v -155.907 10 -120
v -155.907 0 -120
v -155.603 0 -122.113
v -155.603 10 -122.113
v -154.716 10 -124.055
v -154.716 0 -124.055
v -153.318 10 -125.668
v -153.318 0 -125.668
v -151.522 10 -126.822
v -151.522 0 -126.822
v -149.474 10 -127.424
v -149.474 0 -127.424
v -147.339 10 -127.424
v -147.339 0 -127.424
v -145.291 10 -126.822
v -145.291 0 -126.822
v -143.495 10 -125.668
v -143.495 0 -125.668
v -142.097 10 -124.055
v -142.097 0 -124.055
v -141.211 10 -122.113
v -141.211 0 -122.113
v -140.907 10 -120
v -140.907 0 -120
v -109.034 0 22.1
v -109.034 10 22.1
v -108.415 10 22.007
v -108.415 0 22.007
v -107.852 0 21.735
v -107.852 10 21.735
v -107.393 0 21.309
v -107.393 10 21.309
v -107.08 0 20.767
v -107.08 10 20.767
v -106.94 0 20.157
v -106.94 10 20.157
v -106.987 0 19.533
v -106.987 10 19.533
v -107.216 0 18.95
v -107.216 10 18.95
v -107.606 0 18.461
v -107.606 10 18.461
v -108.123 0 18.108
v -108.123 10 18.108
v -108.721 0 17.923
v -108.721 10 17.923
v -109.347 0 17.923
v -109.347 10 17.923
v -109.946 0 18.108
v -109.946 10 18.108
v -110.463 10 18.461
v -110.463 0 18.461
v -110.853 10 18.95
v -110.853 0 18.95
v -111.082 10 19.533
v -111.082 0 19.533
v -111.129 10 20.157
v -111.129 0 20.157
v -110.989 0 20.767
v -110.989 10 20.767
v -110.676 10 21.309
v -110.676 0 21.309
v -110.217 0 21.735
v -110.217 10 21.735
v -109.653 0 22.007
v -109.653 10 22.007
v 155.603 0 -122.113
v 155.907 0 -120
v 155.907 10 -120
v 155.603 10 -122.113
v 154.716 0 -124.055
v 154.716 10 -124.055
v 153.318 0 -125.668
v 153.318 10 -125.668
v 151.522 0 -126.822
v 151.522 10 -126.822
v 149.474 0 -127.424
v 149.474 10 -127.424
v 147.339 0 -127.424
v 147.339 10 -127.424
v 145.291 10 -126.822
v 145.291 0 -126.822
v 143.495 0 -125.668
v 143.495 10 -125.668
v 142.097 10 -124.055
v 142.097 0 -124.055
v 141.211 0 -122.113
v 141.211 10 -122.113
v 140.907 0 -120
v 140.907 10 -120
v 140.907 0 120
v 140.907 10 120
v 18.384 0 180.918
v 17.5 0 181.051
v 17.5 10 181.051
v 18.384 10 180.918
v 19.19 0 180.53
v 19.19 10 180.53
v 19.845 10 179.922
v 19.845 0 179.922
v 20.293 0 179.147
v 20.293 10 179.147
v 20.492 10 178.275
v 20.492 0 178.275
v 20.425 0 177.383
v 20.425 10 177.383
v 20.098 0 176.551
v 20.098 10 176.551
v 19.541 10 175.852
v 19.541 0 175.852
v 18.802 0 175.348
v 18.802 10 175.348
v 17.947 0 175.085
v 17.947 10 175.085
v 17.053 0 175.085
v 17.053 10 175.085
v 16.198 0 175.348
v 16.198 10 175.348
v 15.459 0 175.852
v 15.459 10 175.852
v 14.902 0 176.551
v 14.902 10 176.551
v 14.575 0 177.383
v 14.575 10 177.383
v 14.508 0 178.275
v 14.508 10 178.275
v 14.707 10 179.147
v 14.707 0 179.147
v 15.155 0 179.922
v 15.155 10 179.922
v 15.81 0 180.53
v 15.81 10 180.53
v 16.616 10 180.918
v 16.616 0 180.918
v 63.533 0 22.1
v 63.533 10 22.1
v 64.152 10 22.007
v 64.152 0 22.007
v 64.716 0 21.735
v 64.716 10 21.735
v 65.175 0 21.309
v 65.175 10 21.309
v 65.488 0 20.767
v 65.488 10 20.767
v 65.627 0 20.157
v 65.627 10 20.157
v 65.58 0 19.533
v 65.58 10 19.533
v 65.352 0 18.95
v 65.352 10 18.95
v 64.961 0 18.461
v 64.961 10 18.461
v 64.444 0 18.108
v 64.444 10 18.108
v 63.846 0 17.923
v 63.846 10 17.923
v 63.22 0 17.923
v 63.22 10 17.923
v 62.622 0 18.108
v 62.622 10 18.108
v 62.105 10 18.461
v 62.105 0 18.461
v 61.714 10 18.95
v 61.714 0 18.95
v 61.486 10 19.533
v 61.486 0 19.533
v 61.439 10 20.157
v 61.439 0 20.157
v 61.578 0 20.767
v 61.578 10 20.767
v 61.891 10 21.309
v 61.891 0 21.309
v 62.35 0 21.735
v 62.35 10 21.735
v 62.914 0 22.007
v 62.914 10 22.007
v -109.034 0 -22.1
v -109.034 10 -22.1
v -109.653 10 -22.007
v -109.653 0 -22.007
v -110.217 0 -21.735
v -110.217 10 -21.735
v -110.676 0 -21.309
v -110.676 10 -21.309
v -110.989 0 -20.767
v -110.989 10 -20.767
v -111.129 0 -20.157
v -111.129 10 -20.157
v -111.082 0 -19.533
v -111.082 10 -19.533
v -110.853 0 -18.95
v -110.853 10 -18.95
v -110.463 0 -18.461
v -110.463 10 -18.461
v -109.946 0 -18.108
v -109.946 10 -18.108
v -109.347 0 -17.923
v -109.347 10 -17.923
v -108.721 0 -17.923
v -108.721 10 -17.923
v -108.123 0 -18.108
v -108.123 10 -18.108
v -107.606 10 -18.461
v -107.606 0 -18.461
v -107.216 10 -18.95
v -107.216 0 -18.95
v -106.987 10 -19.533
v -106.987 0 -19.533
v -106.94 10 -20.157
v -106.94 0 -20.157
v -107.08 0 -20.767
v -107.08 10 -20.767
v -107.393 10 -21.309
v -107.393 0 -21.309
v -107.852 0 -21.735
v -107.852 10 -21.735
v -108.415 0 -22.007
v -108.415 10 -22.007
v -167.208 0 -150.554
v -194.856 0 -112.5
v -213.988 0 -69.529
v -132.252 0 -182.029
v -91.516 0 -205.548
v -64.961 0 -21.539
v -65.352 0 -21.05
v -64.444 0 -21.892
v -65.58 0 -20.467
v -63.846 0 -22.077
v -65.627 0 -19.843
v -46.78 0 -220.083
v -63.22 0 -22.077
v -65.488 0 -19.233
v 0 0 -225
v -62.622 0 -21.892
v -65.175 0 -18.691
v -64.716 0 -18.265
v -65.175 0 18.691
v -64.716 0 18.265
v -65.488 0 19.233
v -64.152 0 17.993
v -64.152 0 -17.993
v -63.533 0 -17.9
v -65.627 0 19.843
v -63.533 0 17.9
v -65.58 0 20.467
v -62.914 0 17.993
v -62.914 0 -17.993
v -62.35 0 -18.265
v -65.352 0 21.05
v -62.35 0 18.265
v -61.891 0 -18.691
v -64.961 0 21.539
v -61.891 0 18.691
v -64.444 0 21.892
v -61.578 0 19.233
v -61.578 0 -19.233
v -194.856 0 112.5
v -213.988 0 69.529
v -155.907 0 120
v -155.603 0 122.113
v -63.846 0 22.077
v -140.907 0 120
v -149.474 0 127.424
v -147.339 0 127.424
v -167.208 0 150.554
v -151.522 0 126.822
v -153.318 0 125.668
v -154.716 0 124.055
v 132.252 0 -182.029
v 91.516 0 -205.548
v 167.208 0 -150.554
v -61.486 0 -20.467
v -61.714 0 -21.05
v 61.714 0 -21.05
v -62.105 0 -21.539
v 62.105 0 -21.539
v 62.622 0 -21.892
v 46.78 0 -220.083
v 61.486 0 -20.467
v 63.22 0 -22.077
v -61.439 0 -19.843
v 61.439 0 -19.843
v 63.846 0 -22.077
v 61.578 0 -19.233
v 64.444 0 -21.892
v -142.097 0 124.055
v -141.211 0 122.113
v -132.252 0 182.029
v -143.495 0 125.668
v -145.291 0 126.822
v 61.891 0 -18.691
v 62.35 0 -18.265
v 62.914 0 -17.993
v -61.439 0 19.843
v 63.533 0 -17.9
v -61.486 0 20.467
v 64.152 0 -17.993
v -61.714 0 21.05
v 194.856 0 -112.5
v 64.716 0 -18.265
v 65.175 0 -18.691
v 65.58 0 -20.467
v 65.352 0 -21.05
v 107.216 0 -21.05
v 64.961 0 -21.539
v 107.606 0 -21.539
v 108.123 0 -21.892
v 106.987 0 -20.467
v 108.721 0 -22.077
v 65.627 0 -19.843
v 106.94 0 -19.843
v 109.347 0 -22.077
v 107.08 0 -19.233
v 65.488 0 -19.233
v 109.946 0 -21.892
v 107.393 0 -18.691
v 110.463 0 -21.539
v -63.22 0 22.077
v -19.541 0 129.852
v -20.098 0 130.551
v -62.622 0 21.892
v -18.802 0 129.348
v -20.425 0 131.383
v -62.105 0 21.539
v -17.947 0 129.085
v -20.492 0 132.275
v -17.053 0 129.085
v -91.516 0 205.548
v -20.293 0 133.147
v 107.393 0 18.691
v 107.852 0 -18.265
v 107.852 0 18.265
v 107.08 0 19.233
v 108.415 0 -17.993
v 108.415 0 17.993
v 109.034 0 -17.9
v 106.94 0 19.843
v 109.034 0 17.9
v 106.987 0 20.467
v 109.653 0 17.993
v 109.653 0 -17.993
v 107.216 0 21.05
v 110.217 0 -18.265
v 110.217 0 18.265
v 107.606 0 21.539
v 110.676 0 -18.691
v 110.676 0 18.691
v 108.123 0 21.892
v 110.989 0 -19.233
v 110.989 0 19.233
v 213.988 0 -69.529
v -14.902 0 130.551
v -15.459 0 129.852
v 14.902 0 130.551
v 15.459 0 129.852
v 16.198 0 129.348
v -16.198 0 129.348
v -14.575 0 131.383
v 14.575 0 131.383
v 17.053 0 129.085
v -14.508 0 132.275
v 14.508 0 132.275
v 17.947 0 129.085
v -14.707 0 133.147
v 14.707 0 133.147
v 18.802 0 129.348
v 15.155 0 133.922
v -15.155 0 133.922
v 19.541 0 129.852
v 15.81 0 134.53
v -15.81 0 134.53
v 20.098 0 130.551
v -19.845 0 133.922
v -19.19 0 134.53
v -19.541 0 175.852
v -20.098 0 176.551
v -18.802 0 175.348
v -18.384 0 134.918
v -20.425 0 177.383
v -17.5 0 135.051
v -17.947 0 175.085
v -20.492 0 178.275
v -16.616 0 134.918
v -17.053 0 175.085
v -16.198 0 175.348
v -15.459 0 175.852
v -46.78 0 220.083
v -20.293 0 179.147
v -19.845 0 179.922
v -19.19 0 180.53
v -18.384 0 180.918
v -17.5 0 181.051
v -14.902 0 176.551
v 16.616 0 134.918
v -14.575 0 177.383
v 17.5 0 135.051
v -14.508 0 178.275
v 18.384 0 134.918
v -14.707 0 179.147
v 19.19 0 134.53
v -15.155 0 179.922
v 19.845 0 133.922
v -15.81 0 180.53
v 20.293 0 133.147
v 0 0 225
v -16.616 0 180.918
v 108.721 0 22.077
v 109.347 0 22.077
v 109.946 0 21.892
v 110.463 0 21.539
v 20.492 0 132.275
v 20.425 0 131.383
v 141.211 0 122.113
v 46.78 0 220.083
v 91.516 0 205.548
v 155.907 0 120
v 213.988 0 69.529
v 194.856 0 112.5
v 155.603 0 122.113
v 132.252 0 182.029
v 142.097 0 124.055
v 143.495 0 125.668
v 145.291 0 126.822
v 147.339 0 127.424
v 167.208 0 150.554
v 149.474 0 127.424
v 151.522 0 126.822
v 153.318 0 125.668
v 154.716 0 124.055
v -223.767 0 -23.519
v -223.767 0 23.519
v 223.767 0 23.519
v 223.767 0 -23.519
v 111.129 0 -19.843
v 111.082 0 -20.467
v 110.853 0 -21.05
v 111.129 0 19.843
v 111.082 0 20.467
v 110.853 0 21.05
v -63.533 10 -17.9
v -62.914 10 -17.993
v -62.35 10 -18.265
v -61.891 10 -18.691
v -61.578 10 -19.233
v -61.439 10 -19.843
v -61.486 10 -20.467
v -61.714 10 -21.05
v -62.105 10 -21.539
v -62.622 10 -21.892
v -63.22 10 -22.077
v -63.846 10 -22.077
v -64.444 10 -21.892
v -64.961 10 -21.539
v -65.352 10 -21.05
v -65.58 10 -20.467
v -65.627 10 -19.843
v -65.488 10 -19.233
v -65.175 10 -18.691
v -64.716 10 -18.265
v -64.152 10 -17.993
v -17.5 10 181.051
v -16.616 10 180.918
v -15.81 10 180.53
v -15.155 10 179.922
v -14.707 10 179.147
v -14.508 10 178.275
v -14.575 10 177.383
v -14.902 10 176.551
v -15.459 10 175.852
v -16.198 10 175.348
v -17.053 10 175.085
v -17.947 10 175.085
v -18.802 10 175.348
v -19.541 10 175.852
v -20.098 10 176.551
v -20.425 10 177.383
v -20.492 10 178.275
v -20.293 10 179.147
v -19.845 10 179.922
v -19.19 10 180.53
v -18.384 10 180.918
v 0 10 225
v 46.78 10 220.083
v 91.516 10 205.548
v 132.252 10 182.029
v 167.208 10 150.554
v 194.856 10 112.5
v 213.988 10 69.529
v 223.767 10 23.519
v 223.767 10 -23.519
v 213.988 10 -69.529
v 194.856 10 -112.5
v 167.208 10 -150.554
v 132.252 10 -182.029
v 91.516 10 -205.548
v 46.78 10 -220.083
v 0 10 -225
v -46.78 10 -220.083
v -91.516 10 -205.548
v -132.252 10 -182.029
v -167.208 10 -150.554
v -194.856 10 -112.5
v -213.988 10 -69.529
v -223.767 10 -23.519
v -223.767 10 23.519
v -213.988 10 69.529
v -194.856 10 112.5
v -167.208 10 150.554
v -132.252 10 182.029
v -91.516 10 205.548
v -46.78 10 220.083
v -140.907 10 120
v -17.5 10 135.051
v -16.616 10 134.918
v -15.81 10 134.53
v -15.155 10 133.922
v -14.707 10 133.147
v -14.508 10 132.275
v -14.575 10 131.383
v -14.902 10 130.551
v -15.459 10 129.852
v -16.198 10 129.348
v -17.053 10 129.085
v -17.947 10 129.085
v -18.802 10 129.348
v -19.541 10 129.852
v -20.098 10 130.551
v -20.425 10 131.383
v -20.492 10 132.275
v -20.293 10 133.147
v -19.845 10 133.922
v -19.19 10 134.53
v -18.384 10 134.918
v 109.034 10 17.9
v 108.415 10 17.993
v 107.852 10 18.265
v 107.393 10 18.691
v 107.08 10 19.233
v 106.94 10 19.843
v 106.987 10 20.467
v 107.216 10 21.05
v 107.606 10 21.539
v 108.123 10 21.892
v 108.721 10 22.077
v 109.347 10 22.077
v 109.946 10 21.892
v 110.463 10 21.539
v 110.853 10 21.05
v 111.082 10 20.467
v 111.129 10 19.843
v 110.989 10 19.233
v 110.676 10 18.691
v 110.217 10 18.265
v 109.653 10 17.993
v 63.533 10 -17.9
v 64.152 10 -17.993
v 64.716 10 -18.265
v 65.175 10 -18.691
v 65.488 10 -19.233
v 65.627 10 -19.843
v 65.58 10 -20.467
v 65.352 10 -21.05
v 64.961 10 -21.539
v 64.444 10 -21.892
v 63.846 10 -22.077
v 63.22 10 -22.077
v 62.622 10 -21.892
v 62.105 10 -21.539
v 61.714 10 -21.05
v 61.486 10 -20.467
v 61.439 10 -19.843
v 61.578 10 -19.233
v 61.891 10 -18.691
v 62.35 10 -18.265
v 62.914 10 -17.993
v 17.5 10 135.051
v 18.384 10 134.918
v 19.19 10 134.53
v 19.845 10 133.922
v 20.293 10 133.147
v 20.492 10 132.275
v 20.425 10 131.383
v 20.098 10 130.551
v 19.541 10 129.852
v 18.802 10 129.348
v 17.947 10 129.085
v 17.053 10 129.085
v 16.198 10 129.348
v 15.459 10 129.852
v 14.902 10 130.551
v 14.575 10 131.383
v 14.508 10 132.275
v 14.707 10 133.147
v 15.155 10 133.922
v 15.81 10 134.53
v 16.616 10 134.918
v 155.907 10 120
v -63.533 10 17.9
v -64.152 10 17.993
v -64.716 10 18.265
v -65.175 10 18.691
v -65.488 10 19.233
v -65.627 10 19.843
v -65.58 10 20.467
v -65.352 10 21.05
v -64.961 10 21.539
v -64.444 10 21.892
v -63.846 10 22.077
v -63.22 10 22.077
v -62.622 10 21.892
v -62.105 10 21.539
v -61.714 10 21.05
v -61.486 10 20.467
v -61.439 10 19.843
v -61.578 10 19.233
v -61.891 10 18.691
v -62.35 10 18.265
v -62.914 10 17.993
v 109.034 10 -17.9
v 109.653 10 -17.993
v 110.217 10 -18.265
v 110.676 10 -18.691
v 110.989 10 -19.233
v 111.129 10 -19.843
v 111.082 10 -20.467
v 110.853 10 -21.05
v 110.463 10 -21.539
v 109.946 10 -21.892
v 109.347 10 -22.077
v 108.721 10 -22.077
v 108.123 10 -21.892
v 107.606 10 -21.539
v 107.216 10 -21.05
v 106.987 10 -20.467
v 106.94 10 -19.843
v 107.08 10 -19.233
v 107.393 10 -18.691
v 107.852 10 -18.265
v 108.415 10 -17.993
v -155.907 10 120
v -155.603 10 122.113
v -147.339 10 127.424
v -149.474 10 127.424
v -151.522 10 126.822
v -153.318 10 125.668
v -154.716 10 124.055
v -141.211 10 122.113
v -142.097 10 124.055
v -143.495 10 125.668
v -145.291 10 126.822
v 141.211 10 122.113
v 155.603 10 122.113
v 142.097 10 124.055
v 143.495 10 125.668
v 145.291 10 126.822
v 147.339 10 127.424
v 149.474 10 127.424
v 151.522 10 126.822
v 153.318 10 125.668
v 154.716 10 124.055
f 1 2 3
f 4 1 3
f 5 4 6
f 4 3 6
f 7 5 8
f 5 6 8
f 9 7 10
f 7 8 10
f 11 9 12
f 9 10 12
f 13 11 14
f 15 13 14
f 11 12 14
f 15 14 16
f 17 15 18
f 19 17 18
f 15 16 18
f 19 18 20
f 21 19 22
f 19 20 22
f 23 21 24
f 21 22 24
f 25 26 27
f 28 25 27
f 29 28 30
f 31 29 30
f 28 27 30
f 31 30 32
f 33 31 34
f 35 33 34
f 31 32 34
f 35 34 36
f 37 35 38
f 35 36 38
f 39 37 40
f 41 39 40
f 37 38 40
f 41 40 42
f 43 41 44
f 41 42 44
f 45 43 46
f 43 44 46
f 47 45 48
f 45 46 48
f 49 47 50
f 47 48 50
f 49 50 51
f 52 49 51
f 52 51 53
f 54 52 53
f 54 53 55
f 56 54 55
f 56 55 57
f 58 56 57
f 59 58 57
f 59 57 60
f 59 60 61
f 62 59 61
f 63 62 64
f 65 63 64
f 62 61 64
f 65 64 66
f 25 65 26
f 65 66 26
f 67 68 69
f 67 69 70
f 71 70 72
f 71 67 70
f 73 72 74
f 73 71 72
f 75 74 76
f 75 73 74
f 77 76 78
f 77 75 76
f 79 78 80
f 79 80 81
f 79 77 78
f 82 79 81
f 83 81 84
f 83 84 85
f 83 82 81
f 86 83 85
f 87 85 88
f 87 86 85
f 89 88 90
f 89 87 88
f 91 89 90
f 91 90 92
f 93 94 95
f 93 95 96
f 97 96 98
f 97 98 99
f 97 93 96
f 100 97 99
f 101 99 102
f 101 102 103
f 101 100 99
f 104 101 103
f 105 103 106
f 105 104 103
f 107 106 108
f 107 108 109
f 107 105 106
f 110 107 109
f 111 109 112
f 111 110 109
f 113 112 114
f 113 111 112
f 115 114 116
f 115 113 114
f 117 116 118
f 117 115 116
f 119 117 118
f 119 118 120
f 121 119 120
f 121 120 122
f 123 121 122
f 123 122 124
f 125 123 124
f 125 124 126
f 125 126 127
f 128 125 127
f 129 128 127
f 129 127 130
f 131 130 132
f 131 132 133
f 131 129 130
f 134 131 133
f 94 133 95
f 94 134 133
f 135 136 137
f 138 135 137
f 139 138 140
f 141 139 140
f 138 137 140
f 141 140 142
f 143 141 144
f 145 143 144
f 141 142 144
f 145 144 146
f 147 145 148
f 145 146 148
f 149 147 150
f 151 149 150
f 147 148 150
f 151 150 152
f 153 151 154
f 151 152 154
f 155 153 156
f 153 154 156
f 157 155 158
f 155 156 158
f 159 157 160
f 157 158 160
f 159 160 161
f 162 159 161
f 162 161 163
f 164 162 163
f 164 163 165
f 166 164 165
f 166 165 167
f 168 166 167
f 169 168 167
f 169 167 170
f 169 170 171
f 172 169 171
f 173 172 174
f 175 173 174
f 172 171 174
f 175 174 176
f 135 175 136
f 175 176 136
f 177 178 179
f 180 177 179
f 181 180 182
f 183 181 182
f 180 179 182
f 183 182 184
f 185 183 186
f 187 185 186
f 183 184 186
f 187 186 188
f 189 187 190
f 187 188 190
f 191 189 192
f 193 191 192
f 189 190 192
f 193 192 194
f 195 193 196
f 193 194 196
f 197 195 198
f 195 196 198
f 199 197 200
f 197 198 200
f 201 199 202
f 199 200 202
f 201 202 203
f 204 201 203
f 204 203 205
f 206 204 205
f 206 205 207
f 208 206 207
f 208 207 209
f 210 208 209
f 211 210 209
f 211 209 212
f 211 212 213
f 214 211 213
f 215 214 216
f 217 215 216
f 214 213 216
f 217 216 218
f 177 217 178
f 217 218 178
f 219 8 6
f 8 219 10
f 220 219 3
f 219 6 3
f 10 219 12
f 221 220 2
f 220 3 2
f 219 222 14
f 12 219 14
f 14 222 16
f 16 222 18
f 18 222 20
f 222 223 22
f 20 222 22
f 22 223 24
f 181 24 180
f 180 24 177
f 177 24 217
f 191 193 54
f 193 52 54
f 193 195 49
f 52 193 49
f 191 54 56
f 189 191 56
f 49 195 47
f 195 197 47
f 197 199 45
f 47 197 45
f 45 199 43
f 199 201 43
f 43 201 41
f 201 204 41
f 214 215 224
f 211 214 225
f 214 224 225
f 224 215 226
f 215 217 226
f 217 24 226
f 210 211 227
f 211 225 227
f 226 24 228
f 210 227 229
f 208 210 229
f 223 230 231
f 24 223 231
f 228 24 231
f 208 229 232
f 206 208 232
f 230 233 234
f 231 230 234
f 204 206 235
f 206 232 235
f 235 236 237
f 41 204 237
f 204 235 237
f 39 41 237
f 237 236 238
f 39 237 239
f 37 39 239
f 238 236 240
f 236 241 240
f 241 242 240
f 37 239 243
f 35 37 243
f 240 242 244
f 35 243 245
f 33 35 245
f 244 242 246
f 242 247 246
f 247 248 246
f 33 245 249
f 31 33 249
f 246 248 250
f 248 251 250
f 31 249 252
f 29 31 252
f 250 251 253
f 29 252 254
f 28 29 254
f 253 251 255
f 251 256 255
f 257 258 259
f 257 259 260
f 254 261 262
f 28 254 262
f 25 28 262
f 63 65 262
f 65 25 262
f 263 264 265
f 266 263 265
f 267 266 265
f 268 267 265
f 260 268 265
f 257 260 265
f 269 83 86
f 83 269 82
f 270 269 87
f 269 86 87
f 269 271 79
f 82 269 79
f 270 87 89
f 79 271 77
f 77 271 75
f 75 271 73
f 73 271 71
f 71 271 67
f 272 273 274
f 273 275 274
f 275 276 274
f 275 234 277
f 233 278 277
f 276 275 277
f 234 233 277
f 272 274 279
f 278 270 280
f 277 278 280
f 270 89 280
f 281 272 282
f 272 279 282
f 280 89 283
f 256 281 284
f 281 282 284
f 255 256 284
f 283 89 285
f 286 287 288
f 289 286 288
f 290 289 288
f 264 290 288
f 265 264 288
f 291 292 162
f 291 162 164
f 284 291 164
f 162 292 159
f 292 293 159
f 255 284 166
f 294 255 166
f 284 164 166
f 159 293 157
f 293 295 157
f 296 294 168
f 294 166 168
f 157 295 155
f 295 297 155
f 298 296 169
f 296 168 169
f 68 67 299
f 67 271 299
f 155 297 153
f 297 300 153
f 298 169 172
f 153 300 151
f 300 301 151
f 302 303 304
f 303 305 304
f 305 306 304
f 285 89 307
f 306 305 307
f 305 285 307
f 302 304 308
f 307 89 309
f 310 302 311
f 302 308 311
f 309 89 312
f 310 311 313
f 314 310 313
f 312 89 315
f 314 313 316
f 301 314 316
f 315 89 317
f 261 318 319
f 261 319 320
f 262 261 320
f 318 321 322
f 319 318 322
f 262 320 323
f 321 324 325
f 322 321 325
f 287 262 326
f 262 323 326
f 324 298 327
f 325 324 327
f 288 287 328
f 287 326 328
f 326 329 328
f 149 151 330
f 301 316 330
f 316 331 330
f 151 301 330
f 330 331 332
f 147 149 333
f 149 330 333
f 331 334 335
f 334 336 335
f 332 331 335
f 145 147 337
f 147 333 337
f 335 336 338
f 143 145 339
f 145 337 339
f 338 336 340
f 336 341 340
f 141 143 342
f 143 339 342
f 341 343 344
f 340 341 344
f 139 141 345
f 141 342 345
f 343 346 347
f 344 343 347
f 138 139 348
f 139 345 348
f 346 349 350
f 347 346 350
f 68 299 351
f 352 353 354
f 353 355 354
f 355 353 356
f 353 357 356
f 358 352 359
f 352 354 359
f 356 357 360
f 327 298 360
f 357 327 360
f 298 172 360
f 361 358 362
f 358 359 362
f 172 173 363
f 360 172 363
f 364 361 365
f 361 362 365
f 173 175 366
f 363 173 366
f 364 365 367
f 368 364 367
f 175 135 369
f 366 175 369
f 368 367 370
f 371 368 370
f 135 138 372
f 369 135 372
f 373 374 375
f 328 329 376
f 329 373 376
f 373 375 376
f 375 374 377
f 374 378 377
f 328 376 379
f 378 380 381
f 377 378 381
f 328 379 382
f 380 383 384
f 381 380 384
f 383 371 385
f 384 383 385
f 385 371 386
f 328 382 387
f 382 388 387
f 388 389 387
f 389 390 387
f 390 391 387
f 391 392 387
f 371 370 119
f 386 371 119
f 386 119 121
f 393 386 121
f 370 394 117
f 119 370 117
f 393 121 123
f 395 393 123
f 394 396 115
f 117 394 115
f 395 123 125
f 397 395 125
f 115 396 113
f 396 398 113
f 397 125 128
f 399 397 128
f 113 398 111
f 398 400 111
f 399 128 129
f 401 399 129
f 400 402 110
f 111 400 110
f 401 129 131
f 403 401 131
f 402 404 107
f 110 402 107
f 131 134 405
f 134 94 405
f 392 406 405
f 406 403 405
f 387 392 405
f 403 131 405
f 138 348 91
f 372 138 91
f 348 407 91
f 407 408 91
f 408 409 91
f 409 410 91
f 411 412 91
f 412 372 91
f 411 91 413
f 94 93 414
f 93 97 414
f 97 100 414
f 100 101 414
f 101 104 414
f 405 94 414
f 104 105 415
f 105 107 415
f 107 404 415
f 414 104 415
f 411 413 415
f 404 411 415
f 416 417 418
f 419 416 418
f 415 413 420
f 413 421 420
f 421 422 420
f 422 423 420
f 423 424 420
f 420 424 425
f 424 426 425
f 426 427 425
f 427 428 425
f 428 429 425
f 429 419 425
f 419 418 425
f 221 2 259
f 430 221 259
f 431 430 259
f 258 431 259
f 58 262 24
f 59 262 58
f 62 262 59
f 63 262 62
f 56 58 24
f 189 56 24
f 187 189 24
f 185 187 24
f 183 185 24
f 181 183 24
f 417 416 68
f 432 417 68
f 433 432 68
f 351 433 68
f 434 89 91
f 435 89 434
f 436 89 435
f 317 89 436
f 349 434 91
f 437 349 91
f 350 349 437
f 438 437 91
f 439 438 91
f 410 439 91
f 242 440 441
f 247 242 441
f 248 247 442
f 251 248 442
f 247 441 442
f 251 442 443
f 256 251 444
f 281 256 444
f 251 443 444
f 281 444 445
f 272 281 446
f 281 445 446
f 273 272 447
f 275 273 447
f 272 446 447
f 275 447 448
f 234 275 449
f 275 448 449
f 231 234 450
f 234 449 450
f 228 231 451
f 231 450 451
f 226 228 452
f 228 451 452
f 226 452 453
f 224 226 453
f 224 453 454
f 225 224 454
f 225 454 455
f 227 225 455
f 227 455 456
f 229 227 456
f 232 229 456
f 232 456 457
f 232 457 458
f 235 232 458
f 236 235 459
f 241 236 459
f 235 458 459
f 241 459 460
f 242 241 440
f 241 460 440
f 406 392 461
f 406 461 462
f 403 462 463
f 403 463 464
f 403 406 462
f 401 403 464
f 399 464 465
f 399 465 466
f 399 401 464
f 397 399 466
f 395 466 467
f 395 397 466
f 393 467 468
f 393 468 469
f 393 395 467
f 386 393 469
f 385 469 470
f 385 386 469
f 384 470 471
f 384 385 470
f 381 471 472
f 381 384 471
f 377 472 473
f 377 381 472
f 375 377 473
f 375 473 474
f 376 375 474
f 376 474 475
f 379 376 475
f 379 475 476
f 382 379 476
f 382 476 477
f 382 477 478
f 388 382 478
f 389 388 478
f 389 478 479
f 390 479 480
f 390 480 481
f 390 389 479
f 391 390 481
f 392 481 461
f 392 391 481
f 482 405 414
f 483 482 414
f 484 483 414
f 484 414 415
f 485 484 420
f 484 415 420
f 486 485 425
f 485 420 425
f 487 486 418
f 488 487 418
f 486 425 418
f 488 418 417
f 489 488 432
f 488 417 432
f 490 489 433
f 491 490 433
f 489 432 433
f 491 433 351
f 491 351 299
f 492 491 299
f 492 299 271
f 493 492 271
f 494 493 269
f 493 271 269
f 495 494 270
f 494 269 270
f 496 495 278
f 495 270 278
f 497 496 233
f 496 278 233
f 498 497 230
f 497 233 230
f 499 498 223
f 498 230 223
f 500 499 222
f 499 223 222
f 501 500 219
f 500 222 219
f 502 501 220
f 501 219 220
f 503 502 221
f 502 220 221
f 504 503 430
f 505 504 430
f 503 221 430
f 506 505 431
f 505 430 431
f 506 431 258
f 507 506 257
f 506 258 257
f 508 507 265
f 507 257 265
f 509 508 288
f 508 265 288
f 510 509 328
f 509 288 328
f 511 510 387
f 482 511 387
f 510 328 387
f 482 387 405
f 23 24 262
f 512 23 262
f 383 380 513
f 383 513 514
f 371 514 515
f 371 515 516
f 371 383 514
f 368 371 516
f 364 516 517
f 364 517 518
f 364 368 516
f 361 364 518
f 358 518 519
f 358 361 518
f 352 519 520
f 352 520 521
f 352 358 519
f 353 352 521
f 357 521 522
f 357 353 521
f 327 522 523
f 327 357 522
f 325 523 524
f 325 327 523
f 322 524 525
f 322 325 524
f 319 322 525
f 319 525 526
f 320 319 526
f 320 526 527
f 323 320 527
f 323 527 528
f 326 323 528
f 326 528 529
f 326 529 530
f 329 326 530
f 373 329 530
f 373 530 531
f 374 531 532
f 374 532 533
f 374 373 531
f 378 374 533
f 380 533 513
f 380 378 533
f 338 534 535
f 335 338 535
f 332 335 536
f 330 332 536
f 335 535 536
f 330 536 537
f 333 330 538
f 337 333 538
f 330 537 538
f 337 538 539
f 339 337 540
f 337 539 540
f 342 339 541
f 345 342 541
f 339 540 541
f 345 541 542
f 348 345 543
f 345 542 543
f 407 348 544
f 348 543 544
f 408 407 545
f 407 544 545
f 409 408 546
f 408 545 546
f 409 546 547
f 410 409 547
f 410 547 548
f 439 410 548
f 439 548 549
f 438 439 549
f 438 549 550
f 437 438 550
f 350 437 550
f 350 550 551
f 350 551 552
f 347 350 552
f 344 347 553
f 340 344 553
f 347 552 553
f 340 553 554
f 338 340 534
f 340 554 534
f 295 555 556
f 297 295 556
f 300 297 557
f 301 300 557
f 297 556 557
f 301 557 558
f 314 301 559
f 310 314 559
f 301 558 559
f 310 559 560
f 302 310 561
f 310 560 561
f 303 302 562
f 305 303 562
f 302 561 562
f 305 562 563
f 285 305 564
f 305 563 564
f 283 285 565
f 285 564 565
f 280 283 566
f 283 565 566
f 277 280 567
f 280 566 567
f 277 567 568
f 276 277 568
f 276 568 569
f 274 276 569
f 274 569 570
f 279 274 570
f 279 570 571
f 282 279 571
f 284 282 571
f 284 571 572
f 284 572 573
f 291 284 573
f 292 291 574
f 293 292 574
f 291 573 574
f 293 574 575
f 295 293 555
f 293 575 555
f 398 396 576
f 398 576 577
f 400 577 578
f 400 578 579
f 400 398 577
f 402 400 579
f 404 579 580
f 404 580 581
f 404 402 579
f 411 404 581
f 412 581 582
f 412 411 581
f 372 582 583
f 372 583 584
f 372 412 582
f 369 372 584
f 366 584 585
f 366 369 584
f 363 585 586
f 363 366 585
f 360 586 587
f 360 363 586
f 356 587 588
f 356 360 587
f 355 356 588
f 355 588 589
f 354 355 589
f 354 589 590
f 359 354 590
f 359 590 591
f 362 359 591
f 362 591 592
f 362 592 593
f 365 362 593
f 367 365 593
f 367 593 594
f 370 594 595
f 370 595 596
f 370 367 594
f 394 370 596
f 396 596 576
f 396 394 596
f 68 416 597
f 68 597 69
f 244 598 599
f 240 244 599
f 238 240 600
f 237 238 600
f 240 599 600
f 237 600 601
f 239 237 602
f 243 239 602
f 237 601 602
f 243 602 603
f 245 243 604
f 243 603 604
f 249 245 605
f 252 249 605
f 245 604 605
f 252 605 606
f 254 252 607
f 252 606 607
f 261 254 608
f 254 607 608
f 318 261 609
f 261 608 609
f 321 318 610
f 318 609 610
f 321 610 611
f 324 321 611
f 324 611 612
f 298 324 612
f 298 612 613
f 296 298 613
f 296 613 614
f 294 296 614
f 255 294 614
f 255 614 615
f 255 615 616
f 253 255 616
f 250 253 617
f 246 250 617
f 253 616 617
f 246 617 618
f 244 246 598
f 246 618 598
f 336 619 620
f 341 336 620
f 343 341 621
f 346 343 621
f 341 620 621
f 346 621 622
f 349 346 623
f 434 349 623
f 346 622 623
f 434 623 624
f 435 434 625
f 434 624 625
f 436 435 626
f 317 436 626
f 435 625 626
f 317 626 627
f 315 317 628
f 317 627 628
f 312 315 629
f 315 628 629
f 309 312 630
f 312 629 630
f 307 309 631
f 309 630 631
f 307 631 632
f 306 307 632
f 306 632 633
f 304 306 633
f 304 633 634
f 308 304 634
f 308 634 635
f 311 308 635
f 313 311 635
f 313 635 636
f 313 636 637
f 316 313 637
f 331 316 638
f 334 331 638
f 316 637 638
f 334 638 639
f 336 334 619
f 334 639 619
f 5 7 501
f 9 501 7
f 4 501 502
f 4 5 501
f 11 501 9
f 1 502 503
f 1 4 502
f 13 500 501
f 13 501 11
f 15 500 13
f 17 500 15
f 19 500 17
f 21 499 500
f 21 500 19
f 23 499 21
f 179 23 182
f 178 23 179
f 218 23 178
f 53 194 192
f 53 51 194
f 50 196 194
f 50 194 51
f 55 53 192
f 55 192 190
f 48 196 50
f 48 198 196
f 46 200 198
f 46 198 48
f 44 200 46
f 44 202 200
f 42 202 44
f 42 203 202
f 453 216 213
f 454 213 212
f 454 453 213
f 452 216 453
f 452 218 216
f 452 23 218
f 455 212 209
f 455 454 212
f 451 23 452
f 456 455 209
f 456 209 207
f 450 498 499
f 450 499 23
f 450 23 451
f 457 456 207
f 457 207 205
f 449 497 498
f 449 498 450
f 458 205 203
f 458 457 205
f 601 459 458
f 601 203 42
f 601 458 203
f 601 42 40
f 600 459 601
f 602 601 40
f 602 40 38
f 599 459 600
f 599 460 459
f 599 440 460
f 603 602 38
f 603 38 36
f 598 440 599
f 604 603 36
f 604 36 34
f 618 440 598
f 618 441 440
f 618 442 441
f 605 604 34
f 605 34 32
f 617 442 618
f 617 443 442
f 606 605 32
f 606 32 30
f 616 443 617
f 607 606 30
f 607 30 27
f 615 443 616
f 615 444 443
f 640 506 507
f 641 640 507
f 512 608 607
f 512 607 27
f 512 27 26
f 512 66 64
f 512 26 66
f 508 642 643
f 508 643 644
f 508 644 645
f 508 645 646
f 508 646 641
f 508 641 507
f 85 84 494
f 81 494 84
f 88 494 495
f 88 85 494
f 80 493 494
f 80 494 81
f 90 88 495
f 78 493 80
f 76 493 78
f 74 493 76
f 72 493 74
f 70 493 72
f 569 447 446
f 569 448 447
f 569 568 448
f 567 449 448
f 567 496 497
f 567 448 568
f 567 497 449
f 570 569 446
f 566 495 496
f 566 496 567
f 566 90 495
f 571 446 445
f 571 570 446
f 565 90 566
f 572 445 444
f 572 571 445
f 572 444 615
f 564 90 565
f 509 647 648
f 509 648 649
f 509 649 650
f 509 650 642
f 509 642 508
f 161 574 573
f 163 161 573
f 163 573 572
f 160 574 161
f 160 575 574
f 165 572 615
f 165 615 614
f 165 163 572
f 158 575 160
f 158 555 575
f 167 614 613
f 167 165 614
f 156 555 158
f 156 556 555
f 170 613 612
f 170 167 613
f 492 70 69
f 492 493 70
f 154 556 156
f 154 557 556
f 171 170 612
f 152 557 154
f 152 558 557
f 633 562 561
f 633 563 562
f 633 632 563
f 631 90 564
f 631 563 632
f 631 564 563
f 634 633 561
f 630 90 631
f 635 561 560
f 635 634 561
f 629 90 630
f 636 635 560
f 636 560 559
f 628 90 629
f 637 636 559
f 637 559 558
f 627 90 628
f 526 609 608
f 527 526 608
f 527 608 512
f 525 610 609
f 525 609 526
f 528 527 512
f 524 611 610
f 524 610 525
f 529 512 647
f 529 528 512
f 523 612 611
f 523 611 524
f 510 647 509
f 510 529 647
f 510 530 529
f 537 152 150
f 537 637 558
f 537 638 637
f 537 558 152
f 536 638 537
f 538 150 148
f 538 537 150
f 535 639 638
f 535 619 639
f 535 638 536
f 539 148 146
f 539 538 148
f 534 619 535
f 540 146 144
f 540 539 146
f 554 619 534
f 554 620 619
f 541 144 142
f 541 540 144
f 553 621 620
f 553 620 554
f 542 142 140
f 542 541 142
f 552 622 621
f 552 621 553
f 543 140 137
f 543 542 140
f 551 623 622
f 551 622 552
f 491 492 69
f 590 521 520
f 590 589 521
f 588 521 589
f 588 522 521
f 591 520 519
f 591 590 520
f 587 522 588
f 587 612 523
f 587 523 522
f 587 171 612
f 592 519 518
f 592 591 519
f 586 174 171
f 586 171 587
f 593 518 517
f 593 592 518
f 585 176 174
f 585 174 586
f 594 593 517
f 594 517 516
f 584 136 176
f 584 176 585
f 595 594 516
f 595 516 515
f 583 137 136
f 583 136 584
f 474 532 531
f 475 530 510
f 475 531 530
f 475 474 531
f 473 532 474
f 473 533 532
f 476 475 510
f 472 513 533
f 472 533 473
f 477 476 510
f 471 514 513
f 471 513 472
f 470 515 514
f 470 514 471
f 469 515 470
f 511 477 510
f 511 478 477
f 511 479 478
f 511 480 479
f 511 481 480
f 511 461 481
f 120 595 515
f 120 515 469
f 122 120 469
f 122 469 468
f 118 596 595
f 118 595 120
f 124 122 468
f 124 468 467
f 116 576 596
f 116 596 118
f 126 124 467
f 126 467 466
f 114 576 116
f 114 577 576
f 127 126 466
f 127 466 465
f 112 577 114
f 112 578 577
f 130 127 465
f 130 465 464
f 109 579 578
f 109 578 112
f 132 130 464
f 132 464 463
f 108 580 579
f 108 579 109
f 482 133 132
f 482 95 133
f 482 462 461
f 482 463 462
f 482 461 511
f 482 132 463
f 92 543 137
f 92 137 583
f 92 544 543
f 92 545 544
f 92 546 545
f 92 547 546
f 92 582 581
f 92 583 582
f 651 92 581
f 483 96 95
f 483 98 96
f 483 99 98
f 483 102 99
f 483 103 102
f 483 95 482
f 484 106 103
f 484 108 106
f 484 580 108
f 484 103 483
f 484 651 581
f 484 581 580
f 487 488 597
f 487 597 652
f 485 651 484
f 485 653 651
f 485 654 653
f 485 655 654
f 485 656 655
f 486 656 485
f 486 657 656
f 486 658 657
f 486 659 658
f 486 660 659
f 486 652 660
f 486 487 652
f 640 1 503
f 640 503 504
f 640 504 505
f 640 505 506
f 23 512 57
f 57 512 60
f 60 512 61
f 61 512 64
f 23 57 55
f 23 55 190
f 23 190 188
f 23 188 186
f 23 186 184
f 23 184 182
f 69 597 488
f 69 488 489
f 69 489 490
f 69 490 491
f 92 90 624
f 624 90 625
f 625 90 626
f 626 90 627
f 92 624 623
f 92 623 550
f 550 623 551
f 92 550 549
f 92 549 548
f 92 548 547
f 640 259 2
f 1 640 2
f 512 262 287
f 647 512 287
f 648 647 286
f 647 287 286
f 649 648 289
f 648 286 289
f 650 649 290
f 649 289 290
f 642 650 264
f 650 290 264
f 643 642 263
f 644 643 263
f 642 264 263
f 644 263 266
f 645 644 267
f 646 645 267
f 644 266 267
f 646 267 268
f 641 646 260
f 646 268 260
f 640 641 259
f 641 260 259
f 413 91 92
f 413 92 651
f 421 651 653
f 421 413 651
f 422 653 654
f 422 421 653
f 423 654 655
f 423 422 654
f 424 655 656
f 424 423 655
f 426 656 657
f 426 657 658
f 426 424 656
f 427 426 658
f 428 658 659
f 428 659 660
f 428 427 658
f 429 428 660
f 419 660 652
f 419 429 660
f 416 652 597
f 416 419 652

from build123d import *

# Parameters (mm, degrees)
SKETCH1_R           = 225
SKETCH1_R_2         = 3
BOSS_EXTRUDE1_DEPTH = 10
SKETCH3_R           = 2.1
CUT_EXTRUDE2_DEPTH  = 10


with BuildPart() as part:
    # Sketch1 → Boss-Extrude1 (new body)
    with BuildSketch(Plane(origin=(0, 0, 0), x_dir=(1, 0, 0), z_dir=(0, 1, 0))):
        with Locations(Location((0, 0, 0), (0, 0, 270))):
            Circle(SKETCH1_R)
        with Locations(Location((-17.5, -132.051038191, 0), (0, 0, 270))):
            Circle(SKETCH1_R_2, mode=Mode.SUBTRACT)
        with Locations(Location((17.5, -132.051038191, 0), (0, 0, 270))):
            Circle(SKETCH1_R_2, mode=Mode.SUBTRACT)
        with Locations(Location((17.5, -178.051038191, 0), (0, 0, 270))):
            Circle(SKETCH1_R_2, mode=Mode.SUBTRACT)
        with Locations(Location((-17.5, -178.051038191, 0), (0, 0, 270))):
            Circle(SKETCH1_R_2, mode=Mode.SUBTRACT)
        with BuildLine():
            Line((-155.90685468, -120), (-155.90685468, 120))
            ThreePointArc((-155.90685468, 120), (-148.40685468, 127.5), (-140.90685468, 120))
            Line((-140.90685468, 120), (-140.90685468, -120))
            ThreePointArc((-140.90685468, -120), (-148.40685468, -127.5), (-155.90685468, -120))
        make_face(mode=Mode.SUBTRACT)
        with BuildLine():
            Line((155.90685468, -120), (155.90685468, 120))
            ThreePointArc((155.90685468, 120), (148.40685468, 127.5), (140.90685468, 120))
            Line((140.90685468, 120), (140.90685468, -120))
            ThreePointArc((140.90685468, -120), (148.40685468, -127.5), (155.90685468, -120))
        make_face(mode=Mode.SUBTRACT)
    extrude(amount=BOSS_EXTRUDE1_DEPTH)

    # Sketch3 → Cut-Extrude2 (cut)
    with BuildSketch(Plane(origin=(0, 10, 0), x_dir=(1, 0, 0), z_dir=(0, 1, 0))):
        with Locations(Location((63.533017038, -20, 0), (0, 0, 270))):
            Circle(SKETCH3_R)
        with Locations(Location((63.533017038, 20, 0), (0, 0, 270))):
            Circle(SKETCH3_R)
        with Locations(Location((-63.533017038, -20, 0), (0, 0, 90))):
            Circle(SKETCH3_R)
        with Locations(Location((-109.034473384, -20, 0), (0, 0, 270))):
            Circle(SKETCH3_R)
        with Locations(Location((-63.533017038, 20, 0), (0, 0, 270))):
            Circle(SKETCH3_R)
        with Locations(Location((-109.034473384, 20, 0), (0, 0, 90))):
            Circle(SKETCH3_R)
        with Locations(Location((109.034473384, -20, 0), (0, 0, 90))):
            Circle(SKETCH3_R)
        with Locations(Location((109.034473384, 20, 0), (0, 0, 270))):
            Circle(SKETCH3_R)
    extrude(amount=-CUT_EXTRUDE2_DEPTH, mode=Mode.SUBTRACT)


solid = part.part
